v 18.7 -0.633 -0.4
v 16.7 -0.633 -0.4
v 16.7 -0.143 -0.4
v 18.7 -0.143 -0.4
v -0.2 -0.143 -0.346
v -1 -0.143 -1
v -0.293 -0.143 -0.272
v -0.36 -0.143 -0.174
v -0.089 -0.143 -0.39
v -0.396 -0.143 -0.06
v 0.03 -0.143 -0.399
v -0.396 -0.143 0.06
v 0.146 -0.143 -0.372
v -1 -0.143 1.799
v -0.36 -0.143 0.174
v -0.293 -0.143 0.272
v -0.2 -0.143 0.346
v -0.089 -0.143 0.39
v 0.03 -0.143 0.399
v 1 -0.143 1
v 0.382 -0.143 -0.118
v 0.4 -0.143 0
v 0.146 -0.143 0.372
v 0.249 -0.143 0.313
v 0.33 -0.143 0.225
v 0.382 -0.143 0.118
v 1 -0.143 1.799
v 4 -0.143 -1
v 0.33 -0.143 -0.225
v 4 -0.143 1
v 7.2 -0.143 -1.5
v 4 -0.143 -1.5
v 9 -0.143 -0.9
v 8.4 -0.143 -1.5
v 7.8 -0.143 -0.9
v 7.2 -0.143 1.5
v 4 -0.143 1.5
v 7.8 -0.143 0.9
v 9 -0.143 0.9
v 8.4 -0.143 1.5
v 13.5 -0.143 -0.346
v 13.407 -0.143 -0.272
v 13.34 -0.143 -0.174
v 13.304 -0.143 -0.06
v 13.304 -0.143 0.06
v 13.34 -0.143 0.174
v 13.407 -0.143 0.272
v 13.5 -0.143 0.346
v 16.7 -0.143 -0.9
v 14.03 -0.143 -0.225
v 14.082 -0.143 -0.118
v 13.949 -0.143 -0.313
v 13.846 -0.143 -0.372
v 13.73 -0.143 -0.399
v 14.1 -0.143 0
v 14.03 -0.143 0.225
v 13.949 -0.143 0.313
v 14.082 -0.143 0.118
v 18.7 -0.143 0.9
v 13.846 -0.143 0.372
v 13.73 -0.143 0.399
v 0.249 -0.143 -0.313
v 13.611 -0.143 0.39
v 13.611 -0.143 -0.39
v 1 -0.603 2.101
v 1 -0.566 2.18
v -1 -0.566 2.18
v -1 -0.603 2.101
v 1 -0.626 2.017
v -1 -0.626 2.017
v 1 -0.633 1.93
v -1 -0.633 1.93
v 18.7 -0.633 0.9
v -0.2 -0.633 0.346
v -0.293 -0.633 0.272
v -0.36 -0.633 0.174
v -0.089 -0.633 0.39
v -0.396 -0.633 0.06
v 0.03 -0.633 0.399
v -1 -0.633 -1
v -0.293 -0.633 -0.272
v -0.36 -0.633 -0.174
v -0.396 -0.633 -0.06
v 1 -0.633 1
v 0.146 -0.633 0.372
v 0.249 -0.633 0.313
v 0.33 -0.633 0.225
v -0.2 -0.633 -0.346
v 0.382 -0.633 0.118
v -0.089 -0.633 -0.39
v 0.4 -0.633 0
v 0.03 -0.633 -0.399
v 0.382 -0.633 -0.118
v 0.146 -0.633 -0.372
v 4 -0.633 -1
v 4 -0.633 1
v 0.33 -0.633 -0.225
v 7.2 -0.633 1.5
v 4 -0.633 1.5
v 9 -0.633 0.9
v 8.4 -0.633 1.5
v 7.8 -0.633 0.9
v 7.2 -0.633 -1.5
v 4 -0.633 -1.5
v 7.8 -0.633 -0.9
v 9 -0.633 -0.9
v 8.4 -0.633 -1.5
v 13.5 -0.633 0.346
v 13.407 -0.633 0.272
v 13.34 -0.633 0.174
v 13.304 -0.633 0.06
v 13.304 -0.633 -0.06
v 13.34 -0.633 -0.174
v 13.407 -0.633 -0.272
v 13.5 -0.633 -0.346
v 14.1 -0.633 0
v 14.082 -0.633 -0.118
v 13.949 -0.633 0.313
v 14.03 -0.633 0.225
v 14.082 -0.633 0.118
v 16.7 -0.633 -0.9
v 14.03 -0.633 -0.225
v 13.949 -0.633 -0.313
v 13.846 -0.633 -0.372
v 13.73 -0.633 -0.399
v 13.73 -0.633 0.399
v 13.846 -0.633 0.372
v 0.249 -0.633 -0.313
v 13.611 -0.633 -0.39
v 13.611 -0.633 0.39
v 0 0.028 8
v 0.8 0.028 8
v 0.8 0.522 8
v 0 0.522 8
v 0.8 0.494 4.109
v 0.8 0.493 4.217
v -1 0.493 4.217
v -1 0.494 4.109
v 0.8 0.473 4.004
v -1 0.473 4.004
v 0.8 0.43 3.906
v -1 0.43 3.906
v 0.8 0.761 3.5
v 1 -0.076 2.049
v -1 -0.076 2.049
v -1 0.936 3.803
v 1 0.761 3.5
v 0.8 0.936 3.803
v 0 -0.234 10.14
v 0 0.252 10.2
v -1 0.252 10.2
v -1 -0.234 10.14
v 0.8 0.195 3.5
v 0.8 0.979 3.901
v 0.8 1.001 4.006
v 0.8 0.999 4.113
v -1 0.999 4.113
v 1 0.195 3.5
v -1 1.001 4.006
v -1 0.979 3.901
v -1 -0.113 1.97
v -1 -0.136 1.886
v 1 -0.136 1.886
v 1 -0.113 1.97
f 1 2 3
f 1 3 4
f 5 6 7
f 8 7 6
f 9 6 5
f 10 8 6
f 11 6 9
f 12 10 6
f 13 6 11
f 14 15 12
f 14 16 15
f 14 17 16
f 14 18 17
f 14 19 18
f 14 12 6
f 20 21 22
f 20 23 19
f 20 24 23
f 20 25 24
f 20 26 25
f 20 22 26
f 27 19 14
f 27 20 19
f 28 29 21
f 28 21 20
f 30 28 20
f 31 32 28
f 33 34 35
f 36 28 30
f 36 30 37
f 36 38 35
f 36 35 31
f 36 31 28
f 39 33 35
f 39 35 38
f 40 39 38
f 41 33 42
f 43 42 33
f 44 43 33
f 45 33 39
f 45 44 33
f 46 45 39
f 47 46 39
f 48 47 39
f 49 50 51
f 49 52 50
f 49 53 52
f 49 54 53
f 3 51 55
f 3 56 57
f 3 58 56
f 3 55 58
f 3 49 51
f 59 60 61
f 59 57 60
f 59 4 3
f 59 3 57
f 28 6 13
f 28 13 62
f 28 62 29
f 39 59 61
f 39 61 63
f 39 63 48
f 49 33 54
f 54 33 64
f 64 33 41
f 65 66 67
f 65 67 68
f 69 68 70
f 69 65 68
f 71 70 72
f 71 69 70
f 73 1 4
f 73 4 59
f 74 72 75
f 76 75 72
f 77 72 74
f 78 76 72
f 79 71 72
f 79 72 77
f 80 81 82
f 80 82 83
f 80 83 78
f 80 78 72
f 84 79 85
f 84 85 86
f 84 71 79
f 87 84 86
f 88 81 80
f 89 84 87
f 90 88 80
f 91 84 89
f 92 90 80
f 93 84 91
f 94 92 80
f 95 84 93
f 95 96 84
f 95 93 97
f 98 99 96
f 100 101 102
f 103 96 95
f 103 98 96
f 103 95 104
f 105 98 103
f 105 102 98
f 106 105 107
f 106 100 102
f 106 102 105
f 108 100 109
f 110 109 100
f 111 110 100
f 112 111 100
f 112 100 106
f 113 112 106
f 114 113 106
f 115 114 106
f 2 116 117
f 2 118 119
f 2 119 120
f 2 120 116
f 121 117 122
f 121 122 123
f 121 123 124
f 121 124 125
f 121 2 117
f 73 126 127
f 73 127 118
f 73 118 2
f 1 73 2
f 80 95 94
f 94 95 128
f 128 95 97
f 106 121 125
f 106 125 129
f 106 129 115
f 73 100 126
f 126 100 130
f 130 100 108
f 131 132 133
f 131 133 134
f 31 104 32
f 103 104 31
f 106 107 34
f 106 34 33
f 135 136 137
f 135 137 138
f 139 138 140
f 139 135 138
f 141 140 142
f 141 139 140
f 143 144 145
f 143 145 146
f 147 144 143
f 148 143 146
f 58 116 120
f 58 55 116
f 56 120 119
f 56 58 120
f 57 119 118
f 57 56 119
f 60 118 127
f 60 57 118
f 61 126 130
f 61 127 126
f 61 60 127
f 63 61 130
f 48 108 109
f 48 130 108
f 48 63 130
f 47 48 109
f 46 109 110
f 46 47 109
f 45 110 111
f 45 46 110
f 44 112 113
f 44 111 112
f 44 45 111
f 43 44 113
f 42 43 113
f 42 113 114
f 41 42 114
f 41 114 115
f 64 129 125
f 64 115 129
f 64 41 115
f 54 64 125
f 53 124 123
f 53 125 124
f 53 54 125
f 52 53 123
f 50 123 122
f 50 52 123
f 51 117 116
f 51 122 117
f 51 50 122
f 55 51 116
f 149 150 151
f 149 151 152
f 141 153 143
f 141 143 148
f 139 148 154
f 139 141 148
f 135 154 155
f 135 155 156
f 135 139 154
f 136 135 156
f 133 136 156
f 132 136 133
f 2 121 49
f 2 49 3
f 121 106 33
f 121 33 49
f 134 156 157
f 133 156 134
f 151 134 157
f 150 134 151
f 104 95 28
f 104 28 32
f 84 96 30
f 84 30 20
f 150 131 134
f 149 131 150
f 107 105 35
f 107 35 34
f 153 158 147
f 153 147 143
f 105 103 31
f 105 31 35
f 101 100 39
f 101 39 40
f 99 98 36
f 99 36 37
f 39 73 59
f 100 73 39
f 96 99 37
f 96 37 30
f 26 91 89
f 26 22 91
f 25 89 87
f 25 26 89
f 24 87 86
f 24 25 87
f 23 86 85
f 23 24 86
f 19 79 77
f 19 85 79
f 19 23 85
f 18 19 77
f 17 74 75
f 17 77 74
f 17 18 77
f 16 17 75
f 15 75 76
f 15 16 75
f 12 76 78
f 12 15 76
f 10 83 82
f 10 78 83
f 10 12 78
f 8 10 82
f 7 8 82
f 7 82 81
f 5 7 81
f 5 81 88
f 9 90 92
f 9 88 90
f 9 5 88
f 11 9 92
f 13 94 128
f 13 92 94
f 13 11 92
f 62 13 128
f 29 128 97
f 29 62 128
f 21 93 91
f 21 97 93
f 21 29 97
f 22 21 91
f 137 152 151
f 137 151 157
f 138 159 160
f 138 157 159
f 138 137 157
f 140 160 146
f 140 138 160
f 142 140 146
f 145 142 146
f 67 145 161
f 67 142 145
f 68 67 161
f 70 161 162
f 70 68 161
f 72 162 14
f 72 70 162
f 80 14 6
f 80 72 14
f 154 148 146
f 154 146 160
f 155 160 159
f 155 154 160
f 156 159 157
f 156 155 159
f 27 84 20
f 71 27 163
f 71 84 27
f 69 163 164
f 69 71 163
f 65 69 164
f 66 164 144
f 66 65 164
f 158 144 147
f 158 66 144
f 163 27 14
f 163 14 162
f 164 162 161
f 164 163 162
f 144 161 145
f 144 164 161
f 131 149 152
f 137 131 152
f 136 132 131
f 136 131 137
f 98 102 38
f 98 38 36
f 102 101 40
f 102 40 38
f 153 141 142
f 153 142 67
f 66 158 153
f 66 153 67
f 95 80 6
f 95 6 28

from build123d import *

# Parameters (mm, degrees)
F0_R     = 0.4
F1_DEPTH = 2.5
F3_DEPTH = 35


with BuildPart() as f1:
    # F0 (on Front) → F1 (new body, symmetric)
    with BuildSketch(Plane.XZ):
        Polygon((0, 10.2), (-1, 10.2), (-1, -1), (4, -1), (4, -1.5), (7.2, -1.5), (7.8, -0.9), (8.4, -1.5), (9, -0.9), (16.7, -0.9), (16.7, -0.4), (18.7, -0.4), (18.7, 0.9), (9, 0.9), (8.4, 1.5), (7.8, 0.9), (7.2, 1.5), (4, 1.5), (4, 1), (1, 1), (1, 3.5), (0.8, 3.5), (0.8, 8), (0, 8), align=None)
        Circle(F0_R, mode=Mode.SUBTRACT)
        with Locations((13.7, 0)):
            Circle(F0_R, mode=Mode.SUBTRACT)
    extrude(amount=F1_DEPTH, both=True)

    # F2 (on Right) → F3 (intersect, symmetric)
    with BuildSketch(Plane.YZ):
        with BuildLine():
            ThreePointArc((0.935946, 3.802558), (0.992896, 3.952874), (0.999207, 4.113493))
            Line((0.999207, 4.113493), (0.251877, 10.2))
            Line((0.251877, 10.2), (-0.23447, 10.140284))
            Line((-0.23447, 10.140284), (0.492878, 4.216506))
            ThreePointArc((0.492878, 4.216506), (0.486568, 4.055888), (0.429618, 3.905572))
            Line((0.429618, 3.905572), (-0.566449, 2.180333))
            ThreePointArc((-0.566449, 2.180333), (-0.616399, 2.059743), (-0.633436, 1.930333))
            Line((-0.633436, 1.930333), (-0.633436, -1.5))
            Line((-0.633436, -1.5), (-0.143436, -1.5))
            Line((-0.143436, -1.5), (-0.143436, 1.799038))
            ThreePointArc((-0.143436, 1.799038), (-0.126399, 1.928448), (-0.076449, 2.049038))
            Line((-0.076449, 2.049038), (0.935946, 3.802558))
        make_face()
    extrude(amount=F3_DEPTH, both=True, mode=Mode.INTERSECT)


solid = f1.part
